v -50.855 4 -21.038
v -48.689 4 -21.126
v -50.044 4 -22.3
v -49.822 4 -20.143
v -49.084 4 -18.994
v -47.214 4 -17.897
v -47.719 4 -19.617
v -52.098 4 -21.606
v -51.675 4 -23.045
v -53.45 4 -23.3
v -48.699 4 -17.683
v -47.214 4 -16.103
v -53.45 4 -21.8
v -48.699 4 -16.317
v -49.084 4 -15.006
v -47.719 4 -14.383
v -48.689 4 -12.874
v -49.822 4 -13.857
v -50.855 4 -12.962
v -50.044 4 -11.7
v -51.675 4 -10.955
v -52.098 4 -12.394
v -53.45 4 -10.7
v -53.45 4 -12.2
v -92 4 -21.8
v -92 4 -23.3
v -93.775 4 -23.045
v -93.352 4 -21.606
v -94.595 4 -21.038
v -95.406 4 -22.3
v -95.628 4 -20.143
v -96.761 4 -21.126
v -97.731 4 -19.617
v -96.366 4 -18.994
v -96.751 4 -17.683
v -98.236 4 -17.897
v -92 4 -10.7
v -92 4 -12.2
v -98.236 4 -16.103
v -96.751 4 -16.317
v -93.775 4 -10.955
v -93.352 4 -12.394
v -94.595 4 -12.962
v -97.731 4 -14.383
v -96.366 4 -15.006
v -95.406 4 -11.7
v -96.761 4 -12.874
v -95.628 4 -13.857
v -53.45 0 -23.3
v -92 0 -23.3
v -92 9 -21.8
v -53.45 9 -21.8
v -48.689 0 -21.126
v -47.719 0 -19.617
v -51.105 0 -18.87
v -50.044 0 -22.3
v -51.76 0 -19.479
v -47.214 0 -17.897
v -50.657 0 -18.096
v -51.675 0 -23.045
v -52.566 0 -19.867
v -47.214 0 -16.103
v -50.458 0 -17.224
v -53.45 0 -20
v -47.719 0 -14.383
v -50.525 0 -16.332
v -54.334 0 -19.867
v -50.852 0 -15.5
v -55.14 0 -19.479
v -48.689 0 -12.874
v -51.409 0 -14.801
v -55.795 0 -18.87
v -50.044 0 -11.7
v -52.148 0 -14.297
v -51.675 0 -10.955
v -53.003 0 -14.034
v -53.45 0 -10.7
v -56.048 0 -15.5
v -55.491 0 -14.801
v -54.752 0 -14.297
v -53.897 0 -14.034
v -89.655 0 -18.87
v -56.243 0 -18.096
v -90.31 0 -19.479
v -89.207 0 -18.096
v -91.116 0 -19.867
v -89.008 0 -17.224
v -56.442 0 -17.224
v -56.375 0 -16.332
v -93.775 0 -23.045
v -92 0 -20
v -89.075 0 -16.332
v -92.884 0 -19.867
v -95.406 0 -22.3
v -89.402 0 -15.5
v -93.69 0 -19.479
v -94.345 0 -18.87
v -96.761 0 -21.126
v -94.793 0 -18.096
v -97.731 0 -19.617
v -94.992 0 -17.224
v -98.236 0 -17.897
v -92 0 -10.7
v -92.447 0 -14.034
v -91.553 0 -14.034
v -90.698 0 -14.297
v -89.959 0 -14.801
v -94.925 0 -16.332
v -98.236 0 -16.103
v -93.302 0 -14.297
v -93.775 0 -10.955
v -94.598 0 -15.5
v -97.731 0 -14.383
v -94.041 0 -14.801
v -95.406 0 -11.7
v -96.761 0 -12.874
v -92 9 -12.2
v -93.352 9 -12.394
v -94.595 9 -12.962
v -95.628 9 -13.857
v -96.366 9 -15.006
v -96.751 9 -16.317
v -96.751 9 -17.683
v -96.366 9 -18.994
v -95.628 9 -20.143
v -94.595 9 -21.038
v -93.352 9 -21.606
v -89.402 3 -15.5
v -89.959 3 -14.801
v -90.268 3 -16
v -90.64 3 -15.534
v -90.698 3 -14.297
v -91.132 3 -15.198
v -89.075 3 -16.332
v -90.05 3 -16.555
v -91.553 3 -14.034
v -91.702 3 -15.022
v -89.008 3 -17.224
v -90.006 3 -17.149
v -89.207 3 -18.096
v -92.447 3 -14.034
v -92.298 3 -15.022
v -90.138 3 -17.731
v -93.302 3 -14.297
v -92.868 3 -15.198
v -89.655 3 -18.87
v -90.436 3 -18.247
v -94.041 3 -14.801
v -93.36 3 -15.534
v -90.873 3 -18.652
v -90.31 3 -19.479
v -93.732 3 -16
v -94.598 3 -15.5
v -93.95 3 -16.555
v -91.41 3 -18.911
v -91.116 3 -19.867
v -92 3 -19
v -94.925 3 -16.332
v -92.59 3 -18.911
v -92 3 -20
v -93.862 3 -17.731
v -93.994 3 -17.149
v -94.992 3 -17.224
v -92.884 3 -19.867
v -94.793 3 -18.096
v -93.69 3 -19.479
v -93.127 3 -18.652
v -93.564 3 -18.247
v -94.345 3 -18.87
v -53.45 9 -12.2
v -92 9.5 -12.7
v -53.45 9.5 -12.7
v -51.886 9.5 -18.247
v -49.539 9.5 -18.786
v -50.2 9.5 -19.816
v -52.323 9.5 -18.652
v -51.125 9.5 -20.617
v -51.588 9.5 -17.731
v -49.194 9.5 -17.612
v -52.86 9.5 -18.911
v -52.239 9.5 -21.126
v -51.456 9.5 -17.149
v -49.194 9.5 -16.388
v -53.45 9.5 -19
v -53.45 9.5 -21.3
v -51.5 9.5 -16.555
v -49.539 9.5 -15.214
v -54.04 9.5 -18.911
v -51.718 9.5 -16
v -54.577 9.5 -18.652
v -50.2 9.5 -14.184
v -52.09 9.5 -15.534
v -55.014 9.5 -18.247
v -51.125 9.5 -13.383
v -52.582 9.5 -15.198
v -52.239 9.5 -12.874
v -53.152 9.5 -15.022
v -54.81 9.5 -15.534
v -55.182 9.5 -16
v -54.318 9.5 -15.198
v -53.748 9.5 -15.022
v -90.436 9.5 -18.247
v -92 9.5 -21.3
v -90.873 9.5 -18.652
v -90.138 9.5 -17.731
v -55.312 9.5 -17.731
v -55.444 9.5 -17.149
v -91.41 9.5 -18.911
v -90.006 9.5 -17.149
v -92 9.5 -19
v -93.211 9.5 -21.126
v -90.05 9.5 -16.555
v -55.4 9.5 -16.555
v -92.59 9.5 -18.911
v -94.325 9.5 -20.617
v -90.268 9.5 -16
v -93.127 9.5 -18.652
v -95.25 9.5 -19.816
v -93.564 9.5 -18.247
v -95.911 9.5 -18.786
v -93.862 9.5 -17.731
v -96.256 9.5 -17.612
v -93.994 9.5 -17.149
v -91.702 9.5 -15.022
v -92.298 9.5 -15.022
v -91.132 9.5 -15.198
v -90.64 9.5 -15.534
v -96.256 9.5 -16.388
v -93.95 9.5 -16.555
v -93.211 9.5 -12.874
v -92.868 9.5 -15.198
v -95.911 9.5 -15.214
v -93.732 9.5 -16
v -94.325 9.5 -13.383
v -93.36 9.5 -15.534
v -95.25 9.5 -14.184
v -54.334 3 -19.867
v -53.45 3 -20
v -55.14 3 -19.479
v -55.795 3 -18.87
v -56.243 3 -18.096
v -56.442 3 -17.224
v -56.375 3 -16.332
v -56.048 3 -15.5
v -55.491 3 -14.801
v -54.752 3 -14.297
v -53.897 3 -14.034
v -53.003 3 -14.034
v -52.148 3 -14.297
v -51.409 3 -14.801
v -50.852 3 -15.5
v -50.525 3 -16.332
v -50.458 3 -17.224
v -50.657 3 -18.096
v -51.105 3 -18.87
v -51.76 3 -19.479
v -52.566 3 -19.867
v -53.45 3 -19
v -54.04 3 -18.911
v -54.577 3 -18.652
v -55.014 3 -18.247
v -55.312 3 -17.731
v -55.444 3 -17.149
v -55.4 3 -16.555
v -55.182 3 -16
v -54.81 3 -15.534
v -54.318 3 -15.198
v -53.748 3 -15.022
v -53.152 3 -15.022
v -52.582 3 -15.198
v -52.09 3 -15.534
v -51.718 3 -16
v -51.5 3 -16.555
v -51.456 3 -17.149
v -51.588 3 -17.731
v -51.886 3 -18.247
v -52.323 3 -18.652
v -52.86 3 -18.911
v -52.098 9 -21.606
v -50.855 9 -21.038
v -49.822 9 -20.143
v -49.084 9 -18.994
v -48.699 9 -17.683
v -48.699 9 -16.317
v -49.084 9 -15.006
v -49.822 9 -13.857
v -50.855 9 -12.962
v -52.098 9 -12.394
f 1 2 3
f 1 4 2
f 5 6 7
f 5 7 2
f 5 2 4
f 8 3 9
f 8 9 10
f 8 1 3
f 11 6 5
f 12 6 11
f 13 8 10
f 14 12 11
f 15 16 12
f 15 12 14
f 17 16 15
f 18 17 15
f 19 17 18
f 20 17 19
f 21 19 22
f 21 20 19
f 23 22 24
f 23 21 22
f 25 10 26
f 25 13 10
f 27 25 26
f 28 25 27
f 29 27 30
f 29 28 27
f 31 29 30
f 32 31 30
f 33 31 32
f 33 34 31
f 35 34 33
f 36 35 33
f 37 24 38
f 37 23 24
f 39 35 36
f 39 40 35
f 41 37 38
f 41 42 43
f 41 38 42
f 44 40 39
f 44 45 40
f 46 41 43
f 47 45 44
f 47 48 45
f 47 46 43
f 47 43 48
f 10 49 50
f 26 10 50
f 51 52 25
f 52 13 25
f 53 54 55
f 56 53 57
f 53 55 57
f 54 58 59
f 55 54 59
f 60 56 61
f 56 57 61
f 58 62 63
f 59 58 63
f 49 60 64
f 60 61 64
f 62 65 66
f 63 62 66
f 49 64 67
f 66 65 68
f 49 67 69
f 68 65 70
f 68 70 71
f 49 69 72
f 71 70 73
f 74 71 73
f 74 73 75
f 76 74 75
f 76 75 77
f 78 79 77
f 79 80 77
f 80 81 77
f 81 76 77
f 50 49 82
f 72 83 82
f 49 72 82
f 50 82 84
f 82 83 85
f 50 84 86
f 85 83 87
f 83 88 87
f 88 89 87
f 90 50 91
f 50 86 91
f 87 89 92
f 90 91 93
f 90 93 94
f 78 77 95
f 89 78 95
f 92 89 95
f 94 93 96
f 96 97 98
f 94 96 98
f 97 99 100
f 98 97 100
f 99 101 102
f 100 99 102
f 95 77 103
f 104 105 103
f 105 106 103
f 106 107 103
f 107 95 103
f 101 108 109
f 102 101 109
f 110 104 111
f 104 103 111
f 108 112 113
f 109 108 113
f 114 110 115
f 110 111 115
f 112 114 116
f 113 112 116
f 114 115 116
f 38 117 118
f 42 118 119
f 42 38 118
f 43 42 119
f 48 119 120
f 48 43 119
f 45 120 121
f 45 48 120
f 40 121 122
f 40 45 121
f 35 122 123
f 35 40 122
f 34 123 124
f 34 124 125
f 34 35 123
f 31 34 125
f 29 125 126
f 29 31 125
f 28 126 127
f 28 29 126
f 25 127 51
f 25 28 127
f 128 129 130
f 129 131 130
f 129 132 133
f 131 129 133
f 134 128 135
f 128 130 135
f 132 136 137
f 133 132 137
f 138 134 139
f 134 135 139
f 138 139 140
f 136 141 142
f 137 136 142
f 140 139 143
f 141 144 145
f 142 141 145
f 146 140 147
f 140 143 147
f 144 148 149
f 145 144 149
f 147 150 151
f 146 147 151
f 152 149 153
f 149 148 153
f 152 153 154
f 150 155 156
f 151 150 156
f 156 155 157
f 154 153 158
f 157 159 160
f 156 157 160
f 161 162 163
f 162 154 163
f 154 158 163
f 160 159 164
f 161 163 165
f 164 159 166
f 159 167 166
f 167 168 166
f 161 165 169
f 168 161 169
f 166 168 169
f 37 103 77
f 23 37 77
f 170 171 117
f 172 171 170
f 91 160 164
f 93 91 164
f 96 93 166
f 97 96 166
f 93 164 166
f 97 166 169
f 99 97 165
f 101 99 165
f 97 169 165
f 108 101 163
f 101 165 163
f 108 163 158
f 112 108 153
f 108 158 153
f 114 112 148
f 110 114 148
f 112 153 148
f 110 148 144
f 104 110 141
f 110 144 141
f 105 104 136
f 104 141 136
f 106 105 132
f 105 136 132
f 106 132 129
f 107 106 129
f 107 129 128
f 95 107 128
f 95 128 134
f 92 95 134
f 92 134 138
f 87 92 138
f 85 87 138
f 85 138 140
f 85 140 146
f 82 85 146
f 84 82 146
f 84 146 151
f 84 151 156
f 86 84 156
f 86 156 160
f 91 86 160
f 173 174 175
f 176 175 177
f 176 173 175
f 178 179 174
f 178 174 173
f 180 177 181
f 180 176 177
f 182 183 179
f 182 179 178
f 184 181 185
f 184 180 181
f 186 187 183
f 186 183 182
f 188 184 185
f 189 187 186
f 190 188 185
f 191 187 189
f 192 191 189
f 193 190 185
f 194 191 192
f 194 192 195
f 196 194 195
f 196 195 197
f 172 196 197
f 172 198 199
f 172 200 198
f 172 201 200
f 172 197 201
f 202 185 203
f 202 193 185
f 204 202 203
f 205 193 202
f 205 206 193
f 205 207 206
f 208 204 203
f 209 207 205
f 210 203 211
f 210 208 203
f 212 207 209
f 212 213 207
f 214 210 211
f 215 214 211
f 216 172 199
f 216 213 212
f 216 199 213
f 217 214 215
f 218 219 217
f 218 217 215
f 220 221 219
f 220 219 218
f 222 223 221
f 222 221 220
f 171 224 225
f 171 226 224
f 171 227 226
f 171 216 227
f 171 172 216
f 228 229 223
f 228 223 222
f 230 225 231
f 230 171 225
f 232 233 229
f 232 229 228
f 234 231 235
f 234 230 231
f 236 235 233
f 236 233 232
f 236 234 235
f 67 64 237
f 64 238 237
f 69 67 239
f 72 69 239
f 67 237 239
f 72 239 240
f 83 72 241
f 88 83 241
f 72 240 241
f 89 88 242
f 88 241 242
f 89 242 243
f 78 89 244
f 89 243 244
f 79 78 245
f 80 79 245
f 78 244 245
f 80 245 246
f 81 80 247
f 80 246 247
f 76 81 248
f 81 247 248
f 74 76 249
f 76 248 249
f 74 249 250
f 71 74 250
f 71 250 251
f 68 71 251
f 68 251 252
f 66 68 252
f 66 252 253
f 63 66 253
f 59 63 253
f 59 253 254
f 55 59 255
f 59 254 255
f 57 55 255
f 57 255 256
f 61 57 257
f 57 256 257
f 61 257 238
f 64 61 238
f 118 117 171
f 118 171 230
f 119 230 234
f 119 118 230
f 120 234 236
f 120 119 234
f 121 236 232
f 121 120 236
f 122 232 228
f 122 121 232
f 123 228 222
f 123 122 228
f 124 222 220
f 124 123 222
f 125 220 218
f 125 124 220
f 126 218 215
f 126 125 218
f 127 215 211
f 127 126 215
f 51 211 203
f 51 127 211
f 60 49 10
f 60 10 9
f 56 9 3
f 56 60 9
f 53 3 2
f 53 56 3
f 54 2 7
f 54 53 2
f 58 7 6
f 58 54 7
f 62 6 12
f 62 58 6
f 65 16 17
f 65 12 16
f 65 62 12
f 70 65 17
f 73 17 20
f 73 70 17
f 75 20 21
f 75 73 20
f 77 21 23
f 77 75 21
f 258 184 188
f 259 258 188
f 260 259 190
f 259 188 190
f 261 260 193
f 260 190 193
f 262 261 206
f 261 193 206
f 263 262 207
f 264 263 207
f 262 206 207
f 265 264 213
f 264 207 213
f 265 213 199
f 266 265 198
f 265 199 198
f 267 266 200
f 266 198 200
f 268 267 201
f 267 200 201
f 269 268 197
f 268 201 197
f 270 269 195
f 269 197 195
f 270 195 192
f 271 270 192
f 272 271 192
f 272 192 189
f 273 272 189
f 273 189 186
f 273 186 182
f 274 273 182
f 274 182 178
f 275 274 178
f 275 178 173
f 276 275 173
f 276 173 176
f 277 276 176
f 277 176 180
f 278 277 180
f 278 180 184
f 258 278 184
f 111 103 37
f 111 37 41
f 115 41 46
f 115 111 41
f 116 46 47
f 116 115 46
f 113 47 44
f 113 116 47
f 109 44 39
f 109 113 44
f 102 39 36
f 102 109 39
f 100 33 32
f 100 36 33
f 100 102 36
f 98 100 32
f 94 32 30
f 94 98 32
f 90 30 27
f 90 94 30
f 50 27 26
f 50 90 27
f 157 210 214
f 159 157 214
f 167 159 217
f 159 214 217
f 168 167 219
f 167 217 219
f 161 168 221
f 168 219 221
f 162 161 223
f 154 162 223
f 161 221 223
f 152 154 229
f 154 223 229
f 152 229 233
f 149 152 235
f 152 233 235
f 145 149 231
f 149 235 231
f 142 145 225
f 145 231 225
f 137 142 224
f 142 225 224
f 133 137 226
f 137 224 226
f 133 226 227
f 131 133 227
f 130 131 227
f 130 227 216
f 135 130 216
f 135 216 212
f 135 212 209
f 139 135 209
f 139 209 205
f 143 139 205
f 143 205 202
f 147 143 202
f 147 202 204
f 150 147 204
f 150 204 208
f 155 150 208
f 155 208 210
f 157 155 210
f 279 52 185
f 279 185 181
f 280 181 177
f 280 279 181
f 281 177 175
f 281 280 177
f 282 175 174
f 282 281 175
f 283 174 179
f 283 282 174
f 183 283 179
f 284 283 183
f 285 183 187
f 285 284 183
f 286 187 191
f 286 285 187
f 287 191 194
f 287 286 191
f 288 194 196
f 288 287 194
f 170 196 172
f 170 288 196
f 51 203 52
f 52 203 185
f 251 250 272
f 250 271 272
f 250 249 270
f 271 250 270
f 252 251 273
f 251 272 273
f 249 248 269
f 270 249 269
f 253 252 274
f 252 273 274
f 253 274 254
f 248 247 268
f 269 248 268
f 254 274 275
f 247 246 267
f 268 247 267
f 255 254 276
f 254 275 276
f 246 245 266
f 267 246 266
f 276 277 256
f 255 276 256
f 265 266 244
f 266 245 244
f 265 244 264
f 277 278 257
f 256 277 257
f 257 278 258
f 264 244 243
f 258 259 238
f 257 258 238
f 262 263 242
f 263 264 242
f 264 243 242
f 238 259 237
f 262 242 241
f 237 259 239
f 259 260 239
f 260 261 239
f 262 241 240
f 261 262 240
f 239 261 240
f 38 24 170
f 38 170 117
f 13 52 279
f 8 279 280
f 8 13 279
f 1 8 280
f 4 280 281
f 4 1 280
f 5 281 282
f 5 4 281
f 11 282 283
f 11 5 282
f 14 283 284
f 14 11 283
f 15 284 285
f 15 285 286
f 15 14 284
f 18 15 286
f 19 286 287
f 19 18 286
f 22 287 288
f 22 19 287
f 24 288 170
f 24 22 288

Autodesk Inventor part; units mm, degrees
ref_plane "YZ Plane" through (0, 0, 0) normal (1, 0, 0) x (0, 1, 0)
ref_plane "XZ Plane" through (0, 0, 0) normal (0, 1, 0) x (-1, 0, 0)
ref_plane "XY Plane" through (0, 0, 0) normal (0, 0, 1) x (1, 0, 0)
sketch "Sketch1" plane through (0, 0, 0) normal (0, 1, 0) x (-1, 0, 0)
  line L0 (41.25, -2.25) -> (28.75, -2.25) construction
  line L1 (28.75, -2.25) -> (28.75, -14.75) construction
  line L2 (28.75, -14.75) -> (41.25, -14.75) construction
  line L3 (41.25, -14.75) -> (41.25, -2.25) construction
  line L4 (56.9183, -8.5) -> (8.3915, -8.5) construction
  line L5 (0, -17) -> (105, -17) construction
  line L6 (0, 0) -> (0, -51) construction
  line L7 (0, -34) -> (105, -34) construction
  line L8 (105, -51) -> (105, 0) construction
  line L9 (35, 19) -> (35, -51) construction
  line L10 (56.8064, -25.5) -> (17, -25.5) construction
  line L11 (28.75, -19.25) -> (28.75, -31.75) construction
  line L12 (41.25, -19.25) -> (28.75, -19.25) construction
  line L13 (41.25, -31.75) -> (41.25, -19.25) construction
  line L14 (28.75, -31.75) -> (41.25, -31.75) construction
  line L15 (28.75, -36.25) -> (28.75, -48.75) construction
  line L16 (41.25, -36.25) -> (28.75, -36.25) construction
  line L17 (41.25, -48.75) -> (41.25, -36.25) construction
  line L18 (28.75, -48.75) -> (41.25, -48.75) construction
  line L19 (56.3008, -42.5) -> (16.5498, -42.5) construction
  arc A0 (53.45, -12.2) -> (53.45, -21.8) centre (53.45, -17) ccw
  arc A1 (92, -21.8) -> (92, -12.2) centre (92, -17) ccw
  arc A2 (53.45, -29.2) -> (53.45, -38.8) centre (53.45, -34) ccw construction
  arc A3 (92, -38.8) -> (92, -29.2) centre (92, -34) ccw construction
  line L20 (53.45, -12.2) -> (92, -12.2)
  line L21 (53.45, -21.8) -> (92, -21.8)
  line L22 (53.45, -29.2) -> (92, -29.2) construction
  line L23 (53.45, -38.8) -> (92, -38.8) construction
  arc A4 (16.15, -38.6) -> (16.15, -29.4) centre (16.15, -34) ccw construction
  line L24 (103.5, -49.5) -> (103.5, -1.5) construction
  line L25 (1.5, -1.5) -> (1.5, -49.5) construction
  arc A5 (14, -29.4) -> (14, -38.6) centre (14, -34) ccw construction
  arc A6 (14, -12.4) -> (14, -21.6) centre (14, -17) ccw construction
  line L26 (16.15, -38.6) -> (14, -38.6) construction
  line L27 (14, -29.4) -> (16.15, -29.4) construction
  line L28 (14, -21.6) -> (16.15, -21.6) construction
  line L29 (16.15, -12.4) -> (14, -12.4) construction
  arc A7 (16.15, -21.6) -> (16.15, -12.4) centre (16.15, -17) ccw construction
  arc A8 (96.3, -51) -> (93, -47.7) centre (93, -51) ccw construction
  arc A9 (53.45, -47.7) -> (50.15, -51) centre (53.45, -51) ccw construction
  arc A10 (97.5596, -49.5) -> (93, -46.2) centre (93, -51) ccw construction
  line L30 (93, -46.2) -> (53.45, -46.2) construction
  line L31 (96.3, -51) -> (105, -51) construction
  line L32 (93, -47.7) -> (53.45, -47.7) construction
  line L33 (105, -49.5) -> (97.5596, -49.5) construction
  arc A11 (53.45, -46.2) -> (48.8904, -49.5) centre (53.45, -51) ccw construction
  arc A12 (48.8904, -1.5) -> (53.45, -4.8) centre (53.45, 0) ccw construction
  arc A13 (50.15, 0) -> (53.45, -3.3) centre (53.45, 0) ccw construction
  line L34 (93, -3.3) -> (53.45, -3.3) construction
  line L35 (93, -4.8) -> (53.45, -4.8) construction
  line L36 (97.5596, -1.5) -> (105, -1.5) construction
  line L37 (105, 0) -> (96.3, 0) construction
  arc A14 (93, -3.3) -> (96.3, 0) centre (93, 0) ccw construction
  arc A15 (93, -4.8) -> (97.5596, -1.5) centre (93, 0) ccw construction
  arc A16 (20.45, -51) -> (17.15, -47.7) centre (17.15, -51) ccw construction
  arc A17 (12, -47.7) -> (8.7, -51) centre (12, -51) ccw construction
  line L38 (17.15, -46.2) -> (12, -46.2) construction
  line L39 (17.15, -47.7) -> (12, -47.7) construction
  arc A18 (12, -46.2) -> (7.4404, -49.5) centre (12, -51) ccw construction
  arc A19 (21.7096, -49.5) -> (17.15, -46.2) centre (17.15, -51) ccw construction
  line L40 (48.8904, -49.5) -> (21.7096, -49.5) construction
  line L41 (7.4404, -49.5) -> (0, -49.5) construction
  line L42 (0, -51) -> (8.7, -51) construction
  line L43 (20.45, -51) -> (50.15, -51) construction
  line L44 (17.15, -4.8) -> (12, -4.8) construction
  line L45 (17.15, -3.3) -> (12, -3.3) construction
  arc A20 (8.7, 0) -> (12, -3.3) centre (12, 0) ccw construction
  arc A21 (17.15, -3.3) -> (20.45, 0) centre (17.15, 0) ccw construction
  arc A22 (7.4404, -1.5) -> (12, -4.8) centre (12, 0) ccw construction
  arc A23 (17.15, -4.8) -> (21.7096, -1.5) centre (17.15, 0) ccw construction
  line L46 (50.15, 0) -> (20.45, 0) construction
  line L47 (8.7, 0) -> (0, 0) construction
  line L48 (0, -1.5) -> (7.4404, -1.5) construction
  line L49 (21.7096, -1.5) -> (48.8904, -1.5) construction
  line L50 (113, 2) -> (-20, 2) construction
  line L51 (-20, 2) -> (-20, -53) construction
  line L52 (-20, -53) -> (113, -53) construction
  line L53 (113, -53) -> (113, 2) construction
  arc A24 (92, -23.3) -> (92, -10.7) centre (92, -17) ccw
  arc A25 (53.45, -10.7) -> (53.45, -23.3) centre (53.45, -17) ccw
  line L54 (92, -10.7) -> (53.45, -10.7)
  line L55 (53.45, -23.3) -> (92, -23.3)
  point P0 (35, -8.5)
  point P1 (35, -42.5)
  point P2 (35, -25.5)
  dimension "d0" = 12.5
  dimension "d1" = 12.5
  dimension "d2" = 17
  dimension "d3" = 35
  dimension "d4" = 105
  dimension "d5" = 17
  dimension "d6" = 17
  dimension "d7" = 9.6
  dimension "d8" = 1.5
  dimension "d9" = 1.5
  dimension "d10" = 4.6
  dimension "d11" = 1.5
  dimension "d12" = 1.5
  dimension "d13" = 1.5
  dimension "d14" = 17
  dimension "d15" = 17
  dimension "d16" = 12
  dimension "d17" = 13
  dimension "d18" = 12.2
  dimension "d19" = 11.6
  dimension "d20" = 12.6
  dimension "d21" = 12
  dimension "d22" = 12.5
  dimension "d23" = 2
  dimension "d24" = 8
  dimension "d25" = 20
  dimension "d26" = 1.5
extrude "Extrusion1" add sketch "Sketch1" along normal blind 9.5 contours L20 A1 L21 A0
extrude "Extrusion2" add sketch "Sketch1" along normal blind 4
chamfer "Chamfer1" distance 0.5 angle 45 4 edges at (-72.725, 9.5, -12.2) (-48.65, 9.5, -17) (-72.725, 9.5, -21.8) (-96.8, 9.5, -17)
hole "Hole1" at (-35, 0, -8.5) at (0, 0, -17) at (-35, 0, -42.5) at (-35, 0, -25.5) at (-92, 0, -17) at (-53.45, 0, -17) direction (0, 1, 0) diameter 4 end through all counterbore diameter 6 counterbore depth 3
properties part number "Large_retainer"
